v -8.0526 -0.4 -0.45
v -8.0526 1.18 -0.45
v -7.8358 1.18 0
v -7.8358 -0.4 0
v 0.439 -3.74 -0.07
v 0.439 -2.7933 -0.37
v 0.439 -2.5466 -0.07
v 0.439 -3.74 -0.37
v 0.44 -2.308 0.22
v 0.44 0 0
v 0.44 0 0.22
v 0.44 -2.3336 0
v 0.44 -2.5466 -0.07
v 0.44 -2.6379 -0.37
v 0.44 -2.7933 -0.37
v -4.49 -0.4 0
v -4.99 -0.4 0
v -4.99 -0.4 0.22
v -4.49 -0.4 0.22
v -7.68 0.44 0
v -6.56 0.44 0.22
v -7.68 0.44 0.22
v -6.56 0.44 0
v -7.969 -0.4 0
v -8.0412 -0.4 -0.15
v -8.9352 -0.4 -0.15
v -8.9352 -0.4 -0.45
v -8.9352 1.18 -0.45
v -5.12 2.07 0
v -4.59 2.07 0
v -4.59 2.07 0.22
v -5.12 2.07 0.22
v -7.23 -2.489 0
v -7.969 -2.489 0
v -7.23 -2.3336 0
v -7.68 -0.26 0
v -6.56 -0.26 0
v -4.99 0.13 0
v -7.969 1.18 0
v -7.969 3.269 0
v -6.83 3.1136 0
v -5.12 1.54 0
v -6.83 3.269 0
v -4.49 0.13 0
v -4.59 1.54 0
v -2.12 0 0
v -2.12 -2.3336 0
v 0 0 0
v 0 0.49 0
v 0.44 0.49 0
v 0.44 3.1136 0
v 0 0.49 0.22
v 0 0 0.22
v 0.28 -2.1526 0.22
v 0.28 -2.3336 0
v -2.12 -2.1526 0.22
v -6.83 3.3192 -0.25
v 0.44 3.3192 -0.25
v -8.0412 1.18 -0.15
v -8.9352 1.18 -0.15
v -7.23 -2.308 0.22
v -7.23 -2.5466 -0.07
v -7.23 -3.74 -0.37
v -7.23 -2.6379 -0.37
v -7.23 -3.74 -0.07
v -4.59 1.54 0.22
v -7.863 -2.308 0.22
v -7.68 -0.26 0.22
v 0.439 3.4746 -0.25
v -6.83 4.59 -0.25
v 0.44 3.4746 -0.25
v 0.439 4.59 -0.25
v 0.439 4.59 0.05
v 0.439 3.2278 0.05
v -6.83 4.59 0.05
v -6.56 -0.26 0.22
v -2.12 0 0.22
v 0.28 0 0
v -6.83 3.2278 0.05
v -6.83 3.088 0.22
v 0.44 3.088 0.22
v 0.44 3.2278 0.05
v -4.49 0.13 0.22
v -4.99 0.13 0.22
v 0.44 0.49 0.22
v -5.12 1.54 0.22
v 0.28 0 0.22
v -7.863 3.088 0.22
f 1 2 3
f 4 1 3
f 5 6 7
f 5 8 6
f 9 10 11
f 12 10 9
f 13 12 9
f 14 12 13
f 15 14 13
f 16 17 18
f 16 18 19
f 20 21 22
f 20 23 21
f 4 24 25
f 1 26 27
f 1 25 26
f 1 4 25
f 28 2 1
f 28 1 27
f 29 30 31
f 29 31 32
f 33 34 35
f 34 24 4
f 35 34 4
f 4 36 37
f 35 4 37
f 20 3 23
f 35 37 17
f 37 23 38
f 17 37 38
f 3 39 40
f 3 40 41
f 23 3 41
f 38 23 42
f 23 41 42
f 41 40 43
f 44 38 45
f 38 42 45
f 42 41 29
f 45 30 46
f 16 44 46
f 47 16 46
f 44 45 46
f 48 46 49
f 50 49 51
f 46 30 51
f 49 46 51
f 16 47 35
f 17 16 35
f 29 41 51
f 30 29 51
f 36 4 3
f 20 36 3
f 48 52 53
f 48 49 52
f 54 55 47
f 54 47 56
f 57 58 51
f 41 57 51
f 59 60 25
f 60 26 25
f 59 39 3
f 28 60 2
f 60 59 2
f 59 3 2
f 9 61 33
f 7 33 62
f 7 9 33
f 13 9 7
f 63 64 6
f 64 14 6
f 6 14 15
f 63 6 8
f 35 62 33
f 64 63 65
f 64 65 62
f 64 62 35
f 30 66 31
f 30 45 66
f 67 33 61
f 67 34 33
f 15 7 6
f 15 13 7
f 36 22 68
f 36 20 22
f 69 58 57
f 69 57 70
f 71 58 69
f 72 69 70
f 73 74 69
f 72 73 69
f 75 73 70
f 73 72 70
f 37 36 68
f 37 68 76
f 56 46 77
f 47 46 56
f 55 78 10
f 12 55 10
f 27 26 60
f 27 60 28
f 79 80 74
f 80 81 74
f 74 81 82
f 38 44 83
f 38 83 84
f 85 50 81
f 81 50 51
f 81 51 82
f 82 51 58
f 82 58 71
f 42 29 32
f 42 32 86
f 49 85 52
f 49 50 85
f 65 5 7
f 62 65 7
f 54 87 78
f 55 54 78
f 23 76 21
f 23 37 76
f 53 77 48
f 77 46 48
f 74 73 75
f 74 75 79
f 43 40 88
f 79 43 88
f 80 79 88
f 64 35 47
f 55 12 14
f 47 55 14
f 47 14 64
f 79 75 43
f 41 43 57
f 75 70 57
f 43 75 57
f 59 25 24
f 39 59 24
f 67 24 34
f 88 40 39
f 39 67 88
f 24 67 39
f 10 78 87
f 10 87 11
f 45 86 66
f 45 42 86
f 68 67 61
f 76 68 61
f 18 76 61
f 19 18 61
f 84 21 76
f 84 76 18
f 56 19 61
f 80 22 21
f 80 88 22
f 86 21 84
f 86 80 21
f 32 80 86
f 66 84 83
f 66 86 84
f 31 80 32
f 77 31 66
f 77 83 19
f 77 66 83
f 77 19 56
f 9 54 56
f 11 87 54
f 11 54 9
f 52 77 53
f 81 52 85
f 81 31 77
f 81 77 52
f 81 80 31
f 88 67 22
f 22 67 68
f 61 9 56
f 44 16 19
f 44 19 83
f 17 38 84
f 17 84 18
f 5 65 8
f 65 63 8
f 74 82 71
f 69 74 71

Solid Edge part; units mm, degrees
sketch "Sketch1" plane through (0, 0, 0) normal (0, 0, 1) x (1, 0, 0)
  line L0 (-5.12, 2.07) -> (-5.12, 1.54)
  line L1 (-5.12, 1.54) -> (-4.59, 1.54)
  line L2 (-4.59, 1.54) -> (-4.59, 2.07)
  line L3 (-4.59, 2.07) -> (-5.12, 2.07)
  line L4 (-4.49, 0.13) -> (-4.99, 0.13)
  line L5 (-4.99, 0.13) -> (-4.99, -0.4)
  line L6 (-4.99, -0.4) -> (-4.49, -0.4)
  line L7 (-4.49, -0.4) -> (-4.49, 0.13)
  line L8 (-7.68, -0.26) -> (-6.56, -0.26)
  line L9 (-6.56, -0.26) -> (-6.56, 0.44)
  line L10 (-6.56, 0.44) -> (-7.68, 0.44)
  line L11 (-7.68, 0.44) -> (-7.68, -0.26)
  line L12 (0.44, 0.49) -> (0.44, 4.59)
  line L13 (0.44, 4.59) -> (-6.83, 4.59)
  line L14 (-6.83, 4.59) -> (-6.83, 2.9)
  line L15 (-6.83, 2.9) -> (-8.03, 2.9)
  line L16 (-8.03, 1.18) -> (-8.03, 2.9)
  line L17 (-8.03, 1.18) -> (-8.9351, 1.18)
  line L18 (-8.9351, 1.18) -> (-8.9351, -0.4)
  line L19 (-8.9351, -0.4) -> (-8.03, -0.4)
  line L20 (-8.03, -1.97) -> (-8.03, -0.4)
  line L21 (-8.03, -1.97) -> (-7.23, -1.97)
  line L22 (-7.23, -3.74) -> (-7.23, -1.97)
  line L23 (-7.23, -3.74) -> (0.44, -3.74)
  line L24 (0.44, 0) -> (0.44, -3.74)
  line L25 (0.28, 0) -> (0.44, 0)
  line L26 (0.28, -1.97) -> (0.28, 0)
  line L27 (-2.12, -1.97) -> (0.28, -1.97)
  line L28 (-2.12, 0) -> (-2.12, -1.97)
  line L29 (-2.12, 0) -> (0, 0)
  line L30 (0, 0.49) -> (0, 0)
  line L31 (0.44, 0.49) -> (0, 0.49)
  dimension "D1" = 1.97
  dimension "D2" = 2.9
  dimension "D3" = 2.4
  dimension "D4" = 0.7
  dimension "D5" = 1.12
  dimension "D6" = 0.02
  dimension "D7" = 0.85
extrude "Protrusion1" add sketch "Sketch1" along normal blind 0.22
sketch "Sketch2" plane through (0.44, -1.78, 0.11) normal (1, 0, 0) x (0, 1, 0)
  line L0 (-0.5536, -0.11) -> (-0.8579, -0.48)
  line L1 (-0.8579, -0.48) -> (-1.96, -0.48)
  line L2 (-1.96, -0.48) -> (-1.96, -0.11)
  line L3 (-0.5536, -0.11) -> (-1.96, -0.11)
extrude "Protrusion2" add sketch "Sketch2" against normal up to surface (7.67 mm away)
sketch "Sketch3" plane through (0.44, -1.78, -0.075) normal (1, 0, 0) x (0, 1, 0)
  line L0 (-1.96, 0.005) -> (-0.7666, 0.005)
  line L1 (-0.528, 0.295) -> (-0.7666, 0.005)
  line L2 (-1.96, 0.295) -> (-0.528, 0.295)
  line L3 (-1.96, 0.005) -> (-1.96, 0.295)
  dimension "D1" = 0.3
extrude "Cutout1" cut sketch "Sketch3" against normal through all
sketch "Sketch4" plane through (0.44, 2.54, 0.11) normal (1, 0, 0) x (0, 1, 0)
  line L0 (0.7792, -0.36) -> (0.5736, -0.11)
  line L1 (0.5736, -0.11) -> (2.05, -0.11)
  line L2 (2.05, -0.11) -> (2.05, -0.36)
  line L3 (0.7792, -0.36) -> (2.05, -0.36)
  dimension "D1" = 0.25
extrude "Protrusion3" add sketch "Sketch4" against normal up to surface (7.27 mm away)
sketch "Sketch5" plane through (0.44, 2.54, -0.015) normal (1, 0, 0) x (0, 1, 0)
  line L0 (0.548, 0.235) -> (2.05, 0.235)
  line L1 (2.05, 0.235) -> (2.05, 0.065)
  line L2 (2.05, 0.065) -> (0.6878, 0.065)
  line L3 (0.548, 0.235) -> (0.6878, 0.065)
  dimension "D1" = 0.3
extrude "Cutout2" cut sketch "Sketch5" against normal through all
sketch "Sketch6" plane through (-8.4826, 1.18, 0.11) normal (0, 1, 0) x (-1, 0, 0)
  line L0 (-0.43, -0.56) -> (-0.6468, -0.11)
  line L1 (-0.6468, -0.11) -> (0.4526, -0.11)
  line L2 (0.4526, -0.11) -> (0.4526, -0.56)
  line L3 (-0.43, -0.56) -> (0.4526, -0.56)
  dimension "D1" = 0.45
extrude "Protrusion4" add sketch "Sketch6" against normal up to surface (1.58 mm away)
sketch "Sketch7" plane through (-8.03, 2.04, 0.11) normal (-1, 0, 0) x (0, -1, 0)
  line L0 (-0.86, 0.11) -> (-0.86, -0.11)
  line L1 (-0.86, -0.11) -> (-1.229, -0.11)
  line L2 (-1.229, -0.11) -> (-1.048, 0.11)
  line L3 (-1.048, 0.11) -> (-0.86, 0.11)
  line L4 (4.01, 0.11) -> (4.01, -0.11)
  line L5 (4.529, -0.11) -> (4.01, -0.11)
  line L6 (4.529, -0.11) -> (4.348, 0.11)
  line L7 (4.01, 0.11) -> (4.348, 0.11)
extrude "Protrusion5" add sketch "Sketch7" against normal up to last
sketch "Sketch8" plane through (-8.4825, 1.18, -0.115) normal (0, 1, 0) x (-1, 0, 0)
  line L0 (-0.6195, 0.335) -> (0.4526, 0.335)
  line L1 (0.4526, 0.335) -> (0.4526, -0.035)
  line L2 (0.4526, -0.035) -> (-0.4413, -0.035)
  line L3 (-0.4413, -0.035) -> (-0.6195, 0.335)
  dimension "D1" = 0.3
extrude "Cutout3" cut sketch "Sketch8" along normal through all and the other way through all
sketch "Sketch9" plane through (0.28, -1.05, 0.11) normal (-1, 0, 0) x (0, 1, 0)
  line L0 (-0.92, -0.11) -> (-0.92, 0.11)
  line L1 (-0.92, 0.11) -> (-1.2836, 0.11)
  line L2 (-1.2836, 0.11) -> (-1.1026, -0.11)
  line L3 (-0.92, -0.11) -> (-1.1026, -0.11)
extrude "Cutout4" cut sketch "Sketch9" along normal up to surface (2.4 mm away)
sketch "Sketch10" plane through (0.44, 2.54, -0.015) normal (1, 0, 0) x (0, 1, 0)
  line L0 (2.05, 0.065) -> (2.05, -0.235)
  line L1 (2.05, -0.235) -> (0.9346, -0.235)
  line L2 (0.6878, 0.065) -> (0.9346, -0.235)
  line L3 (2.05, 0.065) -> (0.6878, 0.065)
  line L4 (-6.28, -0.355) -> (-5.3333, -0.355)
  line L5 (-5.0866, -0.055) -> (-5.3333, -0.355)
  line L6 (-6.28, -0.055) -> (-5.0866, -0.055)
  line L7 (-6.28, -0.055) -> (-6.28, -0.355)
extrude "Ausschnitt_7" cut sketch "Sketch10" against normal blind 0.001
